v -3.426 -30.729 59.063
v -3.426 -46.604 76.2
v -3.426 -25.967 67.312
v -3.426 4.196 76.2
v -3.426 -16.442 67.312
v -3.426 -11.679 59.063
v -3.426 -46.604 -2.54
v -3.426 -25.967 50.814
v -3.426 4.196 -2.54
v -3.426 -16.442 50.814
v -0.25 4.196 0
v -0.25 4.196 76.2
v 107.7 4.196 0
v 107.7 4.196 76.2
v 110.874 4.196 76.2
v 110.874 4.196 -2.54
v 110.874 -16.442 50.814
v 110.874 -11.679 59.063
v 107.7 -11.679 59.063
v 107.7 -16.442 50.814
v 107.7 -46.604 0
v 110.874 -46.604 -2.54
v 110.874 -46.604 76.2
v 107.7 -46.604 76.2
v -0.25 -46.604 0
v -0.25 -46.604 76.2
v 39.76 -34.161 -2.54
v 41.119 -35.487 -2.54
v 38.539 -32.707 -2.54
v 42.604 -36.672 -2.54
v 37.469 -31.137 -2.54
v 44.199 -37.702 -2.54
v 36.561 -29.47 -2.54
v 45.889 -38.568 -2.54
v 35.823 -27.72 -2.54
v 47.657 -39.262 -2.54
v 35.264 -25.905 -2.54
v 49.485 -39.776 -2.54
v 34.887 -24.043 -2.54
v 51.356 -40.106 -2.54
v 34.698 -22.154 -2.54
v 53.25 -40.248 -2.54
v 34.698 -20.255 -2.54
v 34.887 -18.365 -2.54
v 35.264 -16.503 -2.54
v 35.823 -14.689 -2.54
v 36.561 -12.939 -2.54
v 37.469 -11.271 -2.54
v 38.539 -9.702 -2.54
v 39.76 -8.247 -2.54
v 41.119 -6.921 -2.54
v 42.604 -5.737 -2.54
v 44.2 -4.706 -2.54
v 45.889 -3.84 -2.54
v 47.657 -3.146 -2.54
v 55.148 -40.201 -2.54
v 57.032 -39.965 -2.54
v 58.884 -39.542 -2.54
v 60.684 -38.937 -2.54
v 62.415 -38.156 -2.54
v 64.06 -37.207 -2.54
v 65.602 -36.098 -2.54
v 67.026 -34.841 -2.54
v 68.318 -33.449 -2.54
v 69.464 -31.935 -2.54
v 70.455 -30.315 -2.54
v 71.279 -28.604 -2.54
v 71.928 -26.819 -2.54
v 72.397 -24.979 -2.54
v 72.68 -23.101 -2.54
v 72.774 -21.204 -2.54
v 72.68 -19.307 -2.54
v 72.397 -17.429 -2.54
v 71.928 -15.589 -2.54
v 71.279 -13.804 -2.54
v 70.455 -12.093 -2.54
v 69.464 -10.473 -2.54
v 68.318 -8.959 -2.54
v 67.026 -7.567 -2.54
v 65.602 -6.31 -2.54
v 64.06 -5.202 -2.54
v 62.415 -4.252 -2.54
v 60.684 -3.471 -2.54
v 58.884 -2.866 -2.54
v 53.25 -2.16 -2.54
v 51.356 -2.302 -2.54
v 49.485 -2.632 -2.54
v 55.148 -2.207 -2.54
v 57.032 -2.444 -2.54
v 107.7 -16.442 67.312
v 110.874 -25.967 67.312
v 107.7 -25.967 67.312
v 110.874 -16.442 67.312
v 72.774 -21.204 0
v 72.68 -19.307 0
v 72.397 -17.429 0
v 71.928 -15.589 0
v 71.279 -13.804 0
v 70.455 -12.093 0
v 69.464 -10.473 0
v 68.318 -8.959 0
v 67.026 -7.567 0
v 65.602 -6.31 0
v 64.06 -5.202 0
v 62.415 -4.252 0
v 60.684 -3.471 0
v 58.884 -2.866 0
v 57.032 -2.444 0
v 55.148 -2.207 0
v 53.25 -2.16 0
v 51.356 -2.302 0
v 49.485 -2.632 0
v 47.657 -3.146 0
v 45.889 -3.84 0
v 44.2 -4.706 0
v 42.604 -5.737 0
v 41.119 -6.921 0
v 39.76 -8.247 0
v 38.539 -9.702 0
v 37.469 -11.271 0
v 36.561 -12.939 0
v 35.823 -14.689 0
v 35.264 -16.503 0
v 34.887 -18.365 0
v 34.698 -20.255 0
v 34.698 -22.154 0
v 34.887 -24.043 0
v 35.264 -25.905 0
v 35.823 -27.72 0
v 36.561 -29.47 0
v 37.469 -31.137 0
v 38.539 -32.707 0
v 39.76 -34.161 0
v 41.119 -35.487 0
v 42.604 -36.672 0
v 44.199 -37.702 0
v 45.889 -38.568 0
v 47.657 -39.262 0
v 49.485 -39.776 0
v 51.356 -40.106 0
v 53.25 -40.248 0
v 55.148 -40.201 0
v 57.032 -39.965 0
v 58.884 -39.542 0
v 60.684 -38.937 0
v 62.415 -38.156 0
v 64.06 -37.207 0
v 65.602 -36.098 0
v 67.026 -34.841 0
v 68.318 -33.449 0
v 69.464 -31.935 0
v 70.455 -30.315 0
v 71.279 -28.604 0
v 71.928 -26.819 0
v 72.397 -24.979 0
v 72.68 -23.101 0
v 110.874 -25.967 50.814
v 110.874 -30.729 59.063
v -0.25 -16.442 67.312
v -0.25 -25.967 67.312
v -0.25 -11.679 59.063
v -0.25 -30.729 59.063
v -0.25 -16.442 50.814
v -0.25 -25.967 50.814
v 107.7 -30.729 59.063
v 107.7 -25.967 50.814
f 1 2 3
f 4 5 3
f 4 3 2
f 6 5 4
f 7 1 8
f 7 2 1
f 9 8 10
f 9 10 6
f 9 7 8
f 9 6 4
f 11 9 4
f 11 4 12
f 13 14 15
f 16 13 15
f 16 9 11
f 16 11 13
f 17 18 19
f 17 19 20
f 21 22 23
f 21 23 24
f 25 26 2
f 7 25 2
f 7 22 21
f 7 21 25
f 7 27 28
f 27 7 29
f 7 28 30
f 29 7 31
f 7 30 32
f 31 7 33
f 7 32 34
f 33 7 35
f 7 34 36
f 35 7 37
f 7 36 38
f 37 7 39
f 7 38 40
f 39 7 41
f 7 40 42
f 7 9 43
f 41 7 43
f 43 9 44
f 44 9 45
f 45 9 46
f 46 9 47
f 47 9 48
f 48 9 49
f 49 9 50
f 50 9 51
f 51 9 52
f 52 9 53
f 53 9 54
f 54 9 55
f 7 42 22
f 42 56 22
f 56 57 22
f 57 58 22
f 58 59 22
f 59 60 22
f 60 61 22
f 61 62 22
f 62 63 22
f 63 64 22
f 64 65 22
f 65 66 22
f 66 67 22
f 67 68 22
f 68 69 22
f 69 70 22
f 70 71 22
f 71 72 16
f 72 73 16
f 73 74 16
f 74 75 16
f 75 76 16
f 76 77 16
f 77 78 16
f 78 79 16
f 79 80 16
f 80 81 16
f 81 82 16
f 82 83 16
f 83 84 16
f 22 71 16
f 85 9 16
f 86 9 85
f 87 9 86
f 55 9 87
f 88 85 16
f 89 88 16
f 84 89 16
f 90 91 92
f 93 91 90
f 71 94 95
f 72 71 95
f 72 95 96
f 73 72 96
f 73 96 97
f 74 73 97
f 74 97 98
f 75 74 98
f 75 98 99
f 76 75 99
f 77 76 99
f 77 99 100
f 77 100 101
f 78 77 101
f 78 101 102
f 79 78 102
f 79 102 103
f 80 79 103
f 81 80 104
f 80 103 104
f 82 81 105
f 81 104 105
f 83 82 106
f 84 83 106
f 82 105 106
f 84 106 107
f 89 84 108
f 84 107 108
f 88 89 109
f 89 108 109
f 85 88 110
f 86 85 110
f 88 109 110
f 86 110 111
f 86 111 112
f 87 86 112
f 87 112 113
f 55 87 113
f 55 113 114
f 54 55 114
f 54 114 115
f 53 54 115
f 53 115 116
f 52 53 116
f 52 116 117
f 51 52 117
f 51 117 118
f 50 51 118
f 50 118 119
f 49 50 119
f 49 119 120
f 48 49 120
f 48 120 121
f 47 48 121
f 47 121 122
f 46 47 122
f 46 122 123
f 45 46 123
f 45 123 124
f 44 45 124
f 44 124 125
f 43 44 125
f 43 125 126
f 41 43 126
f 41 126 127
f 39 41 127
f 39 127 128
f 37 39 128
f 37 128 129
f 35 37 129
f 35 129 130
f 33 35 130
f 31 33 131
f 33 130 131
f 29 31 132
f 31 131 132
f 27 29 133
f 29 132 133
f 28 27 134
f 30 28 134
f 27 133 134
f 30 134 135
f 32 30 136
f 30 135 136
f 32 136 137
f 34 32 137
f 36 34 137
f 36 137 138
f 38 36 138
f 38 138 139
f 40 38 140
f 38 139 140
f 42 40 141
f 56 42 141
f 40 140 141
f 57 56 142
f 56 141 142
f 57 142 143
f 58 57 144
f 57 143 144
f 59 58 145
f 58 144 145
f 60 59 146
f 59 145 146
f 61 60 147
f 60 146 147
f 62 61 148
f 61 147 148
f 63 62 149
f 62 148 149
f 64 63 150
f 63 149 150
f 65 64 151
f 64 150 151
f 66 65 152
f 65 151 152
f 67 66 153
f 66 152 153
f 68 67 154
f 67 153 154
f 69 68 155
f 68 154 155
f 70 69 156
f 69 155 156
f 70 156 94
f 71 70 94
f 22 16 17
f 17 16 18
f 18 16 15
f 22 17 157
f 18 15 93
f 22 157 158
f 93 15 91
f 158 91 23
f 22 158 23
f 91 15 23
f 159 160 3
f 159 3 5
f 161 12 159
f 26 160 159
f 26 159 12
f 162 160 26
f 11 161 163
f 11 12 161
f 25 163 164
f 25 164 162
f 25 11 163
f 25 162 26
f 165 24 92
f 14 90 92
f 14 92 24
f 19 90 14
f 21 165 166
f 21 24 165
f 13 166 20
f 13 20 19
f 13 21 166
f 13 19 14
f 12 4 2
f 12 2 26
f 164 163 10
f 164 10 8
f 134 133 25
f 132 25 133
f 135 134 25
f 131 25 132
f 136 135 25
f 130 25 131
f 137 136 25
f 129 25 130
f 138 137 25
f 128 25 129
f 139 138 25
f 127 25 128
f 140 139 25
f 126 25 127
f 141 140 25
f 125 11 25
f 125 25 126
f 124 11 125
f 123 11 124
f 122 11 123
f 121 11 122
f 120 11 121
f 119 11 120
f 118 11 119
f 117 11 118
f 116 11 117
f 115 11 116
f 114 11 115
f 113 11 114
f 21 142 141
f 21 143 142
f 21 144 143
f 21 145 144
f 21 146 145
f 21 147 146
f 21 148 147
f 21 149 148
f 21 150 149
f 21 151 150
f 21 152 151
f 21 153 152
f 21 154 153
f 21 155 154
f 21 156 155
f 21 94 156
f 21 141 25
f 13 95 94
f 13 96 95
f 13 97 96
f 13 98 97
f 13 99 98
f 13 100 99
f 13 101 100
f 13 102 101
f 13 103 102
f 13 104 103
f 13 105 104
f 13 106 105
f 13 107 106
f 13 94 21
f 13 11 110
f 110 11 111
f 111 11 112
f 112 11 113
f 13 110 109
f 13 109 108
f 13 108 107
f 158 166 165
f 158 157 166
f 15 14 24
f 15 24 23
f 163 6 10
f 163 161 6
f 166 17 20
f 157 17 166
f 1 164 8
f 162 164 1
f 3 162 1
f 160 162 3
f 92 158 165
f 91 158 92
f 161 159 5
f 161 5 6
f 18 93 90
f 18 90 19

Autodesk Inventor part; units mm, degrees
ref_plane "YZ Plane" through (0, 0, 0) normal (1, 0, 0) x (0, 1, 0)
ref_plane "XZ Plane" through (0, 0, 0) normal (0, 1, 0) x (-1, 0, 0)
sketch "Sketch1" plane through (0, 0, 0) normal (0, 0, 1) x (1, 0, 0)
  line L0 (-3.4255, 4.1959) -> (110.8745, 4.1959)
  line L1 (110.8745, 4.1959) -> (110.8745, -46.6041)
  line L2 (110.8745, -46.6041) -> (-3.4255, -46.6041)
  line L3 (-3.4255, -46.6041) -> (-3.4255, 4.1959)
  circle A0 centre (53.7245, -21.2041) radius 19.05
  line L4 (-0.2505, 4.1959) -> (-0.2505, -46.6041)
  line L5 (107.6995, -46.6041) -> (107.6995, 4.1959)
  point P0 (0, 0)
  dimension "d0" = 114.3
  dimension "d1" = 50.8
  dimension "d2" = 38.1
  dimension "d3" = 57.15
  dimension "d4" = 25.4
  dimension "d5" = 3.175
  dimension "d6" = 3.175
extrude "Extrusion1" add sketch "Sketch1" along normal blind 76.2 contours L0 L4 L2 L3 | L0 L1 L2 L5
extrude "Extrusion2" add sketch "Sketch1" against normal blind 2.54
ref_plane "Work Plane2" through (110.8745, -46.6041, 76.2) normal (1, 0, 0) x (0, 0, -1)
sketch "Sketch3" plane through (110.8745, -46.6041, 76.2) normal (1, 0, 0) x (0, 0, -1)
  line L0 (8.888, 20.6375) -> (8.888, 30.1625)
  line L1 (8.888, 30.1625) -> (17.1369, 34.925)
  line L2 (17.1369, 34.925) -> (25.3858, 30.1625)
  line L3 (25.3858, 30.1625) -> (25.3858, 20.6375)
  line L4 (25.3858, 20.6375) -> (17.1369, 15.875)
  line L5 (17.1369, 15.875) -> (8.888, 20.6375)
  line L6 (0, 0) -> (0, 50.8) projected
  line L7 (78.74, 0) -> (0, 0) projected
  point P0 (76.2, 46.6041)
  dimension "d12" = 9.525
  dimension "d13" = 9.525
  dimension "d14" = 120
  dimension "d15" = 9.525
  dimension "d16" = 120
  dimension "d17" = 9.525
  dimension "d18" = 120
  dimension "d19" = 8.888
  dimension "d20" = 15.875
extrude "Extrusion3" cut sketch "Sketch3" against normal blind 127
properties part number "shaft to bicep" material "CFRP"
